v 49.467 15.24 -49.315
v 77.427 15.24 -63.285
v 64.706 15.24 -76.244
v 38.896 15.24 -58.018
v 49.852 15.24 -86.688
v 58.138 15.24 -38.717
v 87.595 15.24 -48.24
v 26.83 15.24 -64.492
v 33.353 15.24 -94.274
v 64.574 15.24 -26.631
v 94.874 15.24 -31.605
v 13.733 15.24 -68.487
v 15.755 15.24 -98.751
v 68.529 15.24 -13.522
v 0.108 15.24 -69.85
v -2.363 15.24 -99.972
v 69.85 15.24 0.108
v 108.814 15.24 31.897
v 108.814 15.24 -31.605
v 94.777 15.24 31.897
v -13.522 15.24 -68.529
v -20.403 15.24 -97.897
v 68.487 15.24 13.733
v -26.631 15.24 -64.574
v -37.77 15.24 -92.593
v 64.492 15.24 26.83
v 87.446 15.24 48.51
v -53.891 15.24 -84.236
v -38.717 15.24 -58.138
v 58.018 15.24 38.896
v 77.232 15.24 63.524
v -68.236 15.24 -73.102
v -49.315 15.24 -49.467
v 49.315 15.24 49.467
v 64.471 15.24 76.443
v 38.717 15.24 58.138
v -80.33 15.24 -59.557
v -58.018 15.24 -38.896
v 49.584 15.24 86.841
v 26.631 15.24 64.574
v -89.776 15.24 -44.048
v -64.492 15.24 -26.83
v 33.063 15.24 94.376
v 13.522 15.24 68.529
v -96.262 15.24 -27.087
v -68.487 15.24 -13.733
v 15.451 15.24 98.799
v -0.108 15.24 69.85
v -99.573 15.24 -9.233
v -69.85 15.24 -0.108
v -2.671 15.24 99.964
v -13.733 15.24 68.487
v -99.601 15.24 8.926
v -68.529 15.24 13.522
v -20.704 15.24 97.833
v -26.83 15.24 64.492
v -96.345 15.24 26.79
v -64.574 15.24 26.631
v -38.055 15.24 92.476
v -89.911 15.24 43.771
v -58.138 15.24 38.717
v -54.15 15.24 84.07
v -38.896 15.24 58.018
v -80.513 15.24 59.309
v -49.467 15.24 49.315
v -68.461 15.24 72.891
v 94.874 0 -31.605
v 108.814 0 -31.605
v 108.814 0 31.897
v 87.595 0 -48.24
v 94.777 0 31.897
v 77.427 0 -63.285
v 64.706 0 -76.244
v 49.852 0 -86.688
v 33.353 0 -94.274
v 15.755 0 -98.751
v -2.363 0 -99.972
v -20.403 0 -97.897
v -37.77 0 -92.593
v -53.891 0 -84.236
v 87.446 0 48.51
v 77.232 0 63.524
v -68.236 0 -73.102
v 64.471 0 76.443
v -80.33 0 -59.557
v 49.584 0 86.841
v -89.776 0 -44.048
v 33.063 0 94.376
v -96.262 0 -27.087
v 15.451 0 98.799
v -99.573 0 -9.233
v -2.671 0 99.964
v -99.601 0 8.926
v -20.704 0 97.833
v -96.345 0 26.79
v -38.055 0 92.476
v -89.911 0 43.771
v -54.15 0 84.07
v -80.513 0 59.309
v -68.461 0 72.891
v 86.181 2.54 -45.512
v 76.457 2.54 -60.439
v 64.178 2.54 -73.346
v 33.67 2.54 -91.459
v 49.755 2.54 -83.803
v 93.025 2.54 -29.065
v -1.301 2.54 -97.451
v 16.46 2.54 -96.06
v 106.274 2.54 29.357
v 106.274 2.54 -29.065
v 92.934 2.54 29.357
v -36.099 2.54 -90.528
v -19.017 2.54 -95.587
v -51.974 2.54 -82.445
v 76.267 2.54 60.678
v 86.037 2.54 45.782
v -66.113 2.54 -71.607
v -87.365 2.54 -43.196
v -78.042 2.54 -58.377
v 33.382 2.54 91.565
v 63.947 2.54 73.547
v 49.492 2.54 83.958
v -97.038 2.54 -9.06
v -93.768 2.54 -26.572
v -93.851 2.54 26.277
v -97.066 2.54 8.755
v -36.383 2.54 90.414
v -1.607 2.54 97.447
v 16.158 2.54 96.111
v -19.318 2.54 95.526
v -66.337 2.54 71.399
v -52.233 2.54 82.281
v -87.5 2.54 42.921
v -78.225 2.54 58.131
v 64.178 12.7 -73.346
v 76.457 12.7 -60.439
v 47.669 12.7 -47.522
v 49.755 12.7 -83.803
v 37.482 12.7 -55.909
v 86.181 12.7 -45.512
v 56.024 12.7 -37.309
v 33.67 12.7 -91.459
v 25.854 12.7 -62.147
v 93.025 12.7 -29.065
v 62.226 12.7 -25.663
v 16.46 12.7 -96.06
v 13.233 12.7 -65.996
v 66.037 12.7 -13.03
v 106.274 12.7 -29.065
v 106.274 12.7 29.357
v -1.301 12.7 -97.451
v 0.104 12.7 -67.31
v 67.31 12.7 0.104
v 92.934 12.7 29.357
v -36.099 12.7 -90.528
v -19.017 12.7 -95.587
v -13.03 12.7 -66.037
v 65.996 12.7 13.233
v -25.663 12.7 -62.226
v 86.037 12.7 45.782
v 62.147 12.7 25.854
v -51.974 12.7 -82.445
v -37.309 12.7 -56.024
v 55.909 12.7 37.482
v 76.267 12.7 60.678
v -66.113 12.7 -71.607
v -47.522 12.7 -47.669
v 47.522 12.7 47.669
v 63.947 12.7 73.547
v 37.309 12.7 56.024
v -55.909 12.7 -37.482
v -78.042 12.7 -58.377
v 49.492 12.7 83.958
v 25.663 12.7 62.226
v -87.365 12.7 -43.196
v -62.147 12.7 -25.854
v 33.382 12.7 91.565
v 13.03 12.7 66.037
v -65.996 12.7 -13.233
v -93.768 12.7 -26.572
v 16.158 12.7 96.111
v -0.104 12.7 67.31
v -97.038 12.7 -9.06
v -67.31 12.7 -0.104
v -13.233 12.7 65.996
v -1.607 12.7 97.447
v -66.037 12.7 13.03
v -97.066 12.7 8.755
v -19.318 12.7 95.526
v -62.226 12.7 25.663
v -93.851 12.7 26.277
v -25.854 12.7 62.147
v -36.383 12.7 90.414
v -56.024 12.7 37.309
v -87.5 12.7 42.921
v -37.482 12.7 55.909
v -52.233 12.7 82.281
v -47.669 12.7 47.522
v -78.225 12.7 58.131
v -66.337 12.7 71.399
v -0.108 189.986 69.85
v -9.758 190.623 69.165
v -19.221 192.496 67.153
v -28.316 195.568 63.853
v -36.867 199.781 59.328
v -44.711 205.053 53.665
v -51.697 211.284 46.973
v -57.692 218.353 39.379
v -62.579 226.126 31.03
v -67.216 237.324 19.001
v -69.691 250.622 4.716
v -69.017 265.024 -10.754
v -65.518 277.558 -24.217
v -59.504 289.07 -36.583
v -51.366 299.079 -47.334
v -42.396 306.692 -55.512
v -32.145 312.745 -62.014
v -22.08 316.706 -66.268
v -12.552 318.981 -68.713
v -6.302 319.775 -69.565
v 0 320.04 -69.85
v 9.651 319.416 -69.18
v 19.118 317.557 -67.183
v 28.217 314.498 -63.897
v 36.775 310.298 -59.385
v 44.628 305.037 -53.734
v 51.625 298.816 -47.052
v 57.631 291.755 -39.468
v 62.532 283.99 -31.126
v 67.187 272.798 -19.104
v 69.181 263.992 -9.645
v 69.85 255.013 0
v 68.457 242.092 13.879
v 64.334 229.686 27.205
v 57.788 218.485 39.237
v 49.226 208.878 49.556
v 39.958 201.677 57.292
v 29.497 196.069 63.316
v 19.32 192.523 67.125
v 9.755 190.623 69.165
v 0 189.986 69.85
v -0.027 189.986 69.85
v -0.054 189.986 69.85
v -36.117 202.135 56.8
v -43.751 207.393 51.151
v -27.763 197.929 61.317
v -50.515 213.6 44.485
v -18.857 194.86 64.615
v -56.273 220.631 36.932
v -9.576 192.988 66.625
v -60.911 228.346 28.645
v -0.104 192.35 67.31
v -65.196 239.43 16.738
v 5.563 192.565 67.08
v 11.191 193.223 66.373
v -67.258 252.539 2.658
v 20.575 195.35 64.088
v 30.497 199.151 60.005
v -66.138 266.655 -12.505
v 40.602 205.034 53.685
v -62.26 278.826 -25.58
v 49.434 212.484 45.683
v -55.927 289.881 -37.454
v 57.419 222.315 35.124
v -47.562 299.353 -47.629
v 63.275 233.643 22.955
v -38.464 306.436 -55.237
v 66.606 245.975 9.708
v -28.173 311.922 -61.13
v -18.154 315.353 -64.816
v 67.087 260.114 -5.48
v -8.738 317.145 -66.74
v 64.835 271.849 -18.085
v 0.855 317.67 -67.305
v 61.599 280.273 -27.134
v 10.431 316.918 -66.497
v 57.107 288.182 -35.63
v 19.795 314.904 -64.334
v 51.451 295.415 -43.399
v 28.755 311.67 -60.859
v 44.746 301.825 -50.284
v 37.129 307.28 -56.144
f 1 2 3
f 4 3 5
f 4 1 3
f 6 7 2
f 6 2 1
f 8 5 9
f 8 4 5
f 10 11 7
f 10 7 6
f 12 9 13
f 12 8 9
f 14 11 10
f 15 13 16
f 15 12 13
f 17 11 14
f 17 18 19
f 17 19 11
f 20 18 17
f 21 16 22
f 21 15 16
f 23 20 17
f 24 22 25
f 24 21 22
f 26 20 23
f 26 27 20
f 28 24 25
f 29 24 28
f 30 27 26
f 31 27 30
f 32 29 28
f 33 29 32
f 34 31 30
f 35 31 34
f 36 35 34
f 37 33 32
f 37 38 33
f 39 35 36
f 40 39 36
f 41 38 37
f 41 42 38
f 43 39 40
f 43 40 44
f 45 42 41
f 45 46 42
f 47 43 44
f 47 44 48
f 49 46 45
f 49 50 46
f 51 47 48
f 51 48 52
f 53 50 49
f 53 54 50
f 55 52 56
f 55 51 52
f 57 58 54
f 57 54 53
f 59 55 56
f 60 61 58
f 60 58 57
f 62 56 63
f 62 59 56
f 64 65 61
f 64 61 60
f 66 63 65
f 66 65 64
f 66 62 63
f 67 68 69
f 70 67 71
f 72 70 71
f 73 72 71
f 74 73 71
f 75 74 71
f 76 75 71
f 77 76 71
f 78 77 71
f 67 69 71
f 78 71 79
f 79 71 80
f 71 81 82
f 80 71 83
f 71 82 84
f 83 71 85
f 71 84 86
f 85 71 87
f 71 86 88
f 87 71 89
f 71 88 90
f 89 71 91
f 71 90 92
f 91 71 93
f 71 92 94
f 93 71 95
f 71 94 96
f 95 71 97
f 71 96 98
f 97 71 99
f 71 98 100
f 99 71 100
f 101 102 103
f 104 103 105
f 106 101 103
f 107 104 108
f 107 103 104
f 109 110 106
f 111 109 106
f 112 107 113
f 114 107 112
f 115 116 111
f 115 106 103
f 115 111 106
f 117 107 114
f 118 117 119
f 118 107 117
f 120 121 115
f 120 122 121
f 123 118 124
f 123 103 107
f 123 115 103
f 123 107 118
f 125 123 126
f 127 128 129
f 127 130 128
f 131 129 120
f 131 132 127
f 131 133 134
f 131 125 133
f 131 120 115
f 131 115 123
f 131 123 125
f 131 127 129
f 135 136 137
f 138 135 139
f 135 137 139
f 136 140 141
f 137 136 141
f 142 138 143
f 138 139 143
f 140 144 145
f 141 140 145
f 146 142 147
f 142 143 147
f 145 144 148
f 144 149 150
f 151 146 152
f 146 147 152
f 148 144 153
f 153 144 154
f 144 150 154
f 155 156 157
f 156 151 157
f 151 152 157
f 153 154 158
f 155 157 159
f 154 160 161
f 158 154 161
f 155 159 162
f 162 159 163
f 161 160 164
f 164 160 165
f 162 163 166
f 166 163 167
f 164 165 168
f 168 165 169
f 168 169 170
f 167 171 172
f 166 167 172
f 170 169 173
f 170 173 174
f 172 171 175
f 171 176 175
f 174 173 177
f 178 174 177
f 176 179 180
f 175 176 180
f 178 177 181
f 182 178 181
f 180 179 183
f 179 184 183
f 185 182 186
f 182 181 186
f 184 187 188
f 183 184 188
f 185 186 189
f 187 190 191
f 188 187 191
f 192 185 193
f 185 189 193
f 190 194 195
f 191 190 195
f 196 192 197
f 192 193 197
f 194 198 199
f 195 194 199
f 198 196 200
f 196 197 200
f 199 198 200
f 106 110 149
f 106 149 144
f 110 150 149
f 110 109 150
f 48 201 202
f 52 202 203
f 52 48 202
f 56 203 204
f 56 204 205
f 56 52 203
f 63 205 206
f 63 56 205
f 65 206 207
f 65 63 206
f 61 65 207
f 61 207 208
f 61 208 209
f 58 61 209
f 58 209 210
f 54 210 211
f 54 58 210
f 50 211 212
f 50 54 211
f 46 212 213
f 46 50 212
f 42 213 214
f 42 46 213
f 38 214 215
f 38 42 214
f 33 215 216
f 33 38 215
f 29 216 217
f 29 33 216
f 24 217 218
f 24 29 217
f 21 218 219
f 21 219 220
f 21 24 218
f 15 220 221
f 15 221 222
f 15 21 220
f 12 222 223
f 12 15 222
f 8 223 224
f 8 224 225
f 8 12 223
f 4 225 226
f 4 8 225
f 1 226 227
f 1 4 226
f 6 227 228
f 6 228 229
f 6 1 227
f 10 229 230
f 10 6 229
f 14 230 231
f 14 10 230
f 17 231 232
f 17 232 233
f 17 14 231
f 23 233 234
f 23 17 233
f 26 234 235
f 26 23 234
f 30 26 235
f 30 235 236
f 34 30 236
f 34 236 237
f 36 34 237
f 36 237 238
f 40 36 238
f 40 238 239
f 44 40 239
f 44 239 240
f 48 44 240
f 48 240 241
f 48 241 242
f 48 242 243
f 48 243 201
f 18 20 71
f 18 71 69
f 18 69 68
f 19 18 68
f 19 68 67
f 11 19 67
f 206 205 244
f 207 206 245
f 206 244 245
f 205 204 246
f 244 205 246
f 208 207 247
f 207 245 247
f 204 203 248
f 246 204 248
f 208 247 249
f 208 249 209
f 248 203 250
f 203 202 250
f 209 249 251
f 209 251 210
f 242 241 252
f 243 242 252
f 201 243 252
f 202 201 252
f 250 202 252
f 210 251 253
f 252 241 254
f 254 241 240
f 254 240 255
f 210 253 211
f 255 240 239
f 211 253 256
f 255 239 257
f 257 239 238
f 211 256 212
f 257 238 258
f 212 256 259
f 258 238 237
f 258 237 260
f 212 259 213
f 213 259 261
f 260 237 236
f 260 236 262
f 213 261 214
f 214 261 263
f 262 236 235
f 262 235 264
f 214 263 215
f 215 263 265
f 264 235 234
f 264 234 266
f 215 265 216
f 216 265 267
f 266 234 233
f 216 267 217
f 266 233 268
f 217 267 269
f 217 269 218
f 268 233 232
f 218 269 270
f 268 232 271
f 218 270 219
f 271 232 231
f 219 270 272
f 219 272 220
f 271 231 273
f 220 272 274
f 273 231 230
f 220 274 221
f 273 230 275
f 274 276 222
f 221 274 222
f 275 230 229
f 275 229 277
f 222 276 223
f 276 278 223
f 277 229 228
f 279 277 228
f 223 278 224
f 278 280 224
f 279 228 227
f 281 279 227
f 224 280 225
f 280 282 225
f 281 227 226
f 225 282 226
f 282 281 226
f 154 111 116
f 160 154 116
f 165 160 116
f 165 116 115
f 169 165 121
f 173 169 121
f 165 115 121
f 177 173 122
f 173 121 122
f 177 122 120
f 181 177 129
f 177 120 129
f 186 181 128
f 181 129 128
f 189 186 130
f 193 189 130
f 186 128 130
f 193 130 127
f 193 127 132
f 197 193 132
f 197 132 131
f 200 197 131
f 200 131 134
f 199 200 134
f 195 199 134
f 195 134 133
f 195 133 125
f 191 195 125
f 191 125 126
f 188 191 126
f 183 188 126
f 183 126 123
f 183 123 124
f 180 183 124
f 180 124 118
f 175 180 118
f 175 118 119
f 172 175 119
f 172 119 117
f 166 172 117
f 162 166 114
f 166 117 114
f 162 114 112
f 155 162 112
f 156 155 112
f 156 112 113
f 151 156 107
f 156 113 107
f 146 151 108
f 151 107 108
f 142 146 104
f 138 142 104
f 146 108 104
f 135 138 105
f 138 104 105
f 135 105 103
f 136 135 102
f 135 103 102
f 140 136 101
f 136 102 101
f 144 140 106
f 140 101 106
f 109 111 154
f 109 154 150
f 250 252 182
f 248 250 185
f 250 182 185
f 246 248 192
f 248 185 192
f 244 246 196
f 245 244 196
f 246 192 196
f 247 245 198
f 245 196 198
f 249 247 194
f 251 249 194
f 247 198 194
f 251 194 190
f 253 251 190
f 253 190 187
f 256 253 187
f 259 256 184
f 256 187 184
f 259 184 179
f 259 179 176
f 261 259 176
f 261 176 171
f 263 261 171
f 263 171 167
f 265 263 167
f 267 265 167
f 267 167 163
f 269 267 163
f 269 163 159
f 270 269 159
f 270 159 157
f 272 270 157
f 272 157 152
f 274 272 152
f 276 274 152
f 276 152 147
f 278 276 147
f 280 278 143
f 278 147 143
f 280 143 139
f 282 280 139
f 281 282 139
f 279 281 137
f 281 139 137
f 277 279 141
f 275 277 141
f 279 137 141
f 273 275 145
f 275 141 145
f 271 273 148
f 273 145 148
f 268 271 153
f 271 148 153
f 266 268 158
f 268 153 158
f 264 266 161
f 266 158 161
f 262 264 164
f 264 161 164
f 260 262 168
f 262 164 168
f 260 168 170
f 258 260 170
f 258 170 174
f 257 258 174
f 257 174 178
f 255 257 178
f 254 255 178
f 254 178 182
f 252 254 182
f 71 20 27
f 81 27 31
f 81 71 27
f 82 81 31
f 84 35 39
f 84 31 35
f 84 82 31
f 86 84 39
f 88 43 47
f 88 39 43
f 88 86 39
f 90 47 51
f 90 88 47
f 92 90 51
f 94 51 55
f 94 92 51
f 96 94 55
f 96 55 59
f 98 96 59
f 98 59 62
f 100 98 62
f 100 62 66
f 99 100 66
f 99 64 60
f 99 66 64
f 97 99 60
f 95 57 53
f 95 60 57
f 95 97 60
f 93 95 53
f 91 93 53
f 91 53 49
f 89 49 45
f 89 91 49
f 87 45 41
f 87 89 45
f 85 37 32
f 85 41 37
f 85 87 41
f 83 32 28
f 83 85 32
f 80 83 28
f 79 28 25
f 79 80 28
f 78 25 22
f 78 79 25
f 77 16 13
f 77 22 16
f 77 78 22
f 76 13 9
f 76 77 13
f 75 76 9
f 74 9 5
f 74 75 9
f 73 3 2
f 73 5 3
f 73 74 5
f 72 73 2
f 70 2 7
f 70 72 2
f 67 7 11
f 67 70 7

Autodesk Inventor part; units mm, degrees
ref_plane "YZ Plane" through (0, 0, 0) normal (1, 0, 0) x (0, 1, 0)
ref_plane "XZ Plane" through (0, 0, 0) normal (0, 1, 0) x (-1, 0, 0)
ref_plane "XY Plane" through (0, 0, 0) normal (0, 0, 1) x (1, 0, 0)
sketch "Sketch1" plane through (0, 0, 0) normal (0, 1, 0) x (-1, 0, 0)
  circle A0 centre (0, 0) radius 100
  line L0 (-76.20071, 31.896636) -> (-108.814125, 31.896636)
  line L1 (-108.814125, 31.896636) -> (-108.814125, -31.604509)
  line L2 (-108.814125, -31.604509) -> (-76.20071, -31.604509)
  line L3 (-76.20071, -31.604509) -> (-76.20071, 31.896636)
  point P0 (-94.874417, -31.604509)
  point P1 (-94.776604, 31.896636)
  dimension "d0" = 200
sketch "Sketch1 outline for Extrusion1" plane through (0, 0, 0) normal (0, 1, 0) x (-1, 0, 0)
  line L0 (-94.776604, 31.896636) -> (-108.814125, 31.896636)
  line L1 (-108.814125, 31.896636) -> (-108.814125, -31.604509)
  line L2 (-108.814125, -31.604509) -> (-94.874417, -31.604509)
  arc A0 (-94.874417, -31.604509) -> (-94.776604, 31.896636) centre (0, 0) ccw
extrude "Extrusion1" add sketch "Sketch1 outline for Extrusion1" along normal blind 15.24
sketch "Sketch2" plane through (0, 15.24, 0) normal (0, 1, 0) x (-0.0015403, 0, 0.9999988)
  circle A0 centre (0, 0) radius 69.85
  dimension "d3" = 139.7
sketch "Sketch2 outline for Extrusion2" plane through (0, 15.24, 0) normal (0, 1, 0) x (-0.0015403, 0, 0.9999988)
  circle A0 centre (0, 0) radius 69.85
extrude "Extrusion2" add sketch "Sketch2 outline for Extrusion2" along normal blind 304.8
ref_plane "Work Plane1" through (69.85, 15.24, 0) normal (1, 0, 0) x (0, 0, -1)
sketch "Sketch3" plane through (69.85, 15.24, 0) normal (1, 0, 0) x (0, 0, -1)
  line L0 (-69.85, 0) -> (-69.85, 304.8)
  line L1 (69.85, 304.8) -> (-69.85, 304.8)
  line L2 (-69.85, 174.745803) -> (69.85, 304.8)
  line L3 (69.85, 304.8) -> (-69.85, 304.8)
  line L4 (-69.85, 304.8) -> (-69.85, 174.745803)
  point P0 (0, -15.24)
sketch "Sketch3 outline for Extrusion3" plane through (69.85, 15.24, 0) normal (1, 0, 0) x (0, 0, -1)
  line L0 (-69.85, 174.745803) -> (69.85, 304.8)
  line L1 (-69.85, 304.8) -> (-69.85, 174.745803)
  line L2 (69.85, 304.8) -> (-69.85, 304.8)
extrude "Extrusion3" cut sketch "Sketch3 outline for Extrusion3" against normal through all
shell "Shell1" thickness 2.54 removed faces 1 at (-23.178976, 247.634165, 7.925999)
properties part number "OCAMS"
